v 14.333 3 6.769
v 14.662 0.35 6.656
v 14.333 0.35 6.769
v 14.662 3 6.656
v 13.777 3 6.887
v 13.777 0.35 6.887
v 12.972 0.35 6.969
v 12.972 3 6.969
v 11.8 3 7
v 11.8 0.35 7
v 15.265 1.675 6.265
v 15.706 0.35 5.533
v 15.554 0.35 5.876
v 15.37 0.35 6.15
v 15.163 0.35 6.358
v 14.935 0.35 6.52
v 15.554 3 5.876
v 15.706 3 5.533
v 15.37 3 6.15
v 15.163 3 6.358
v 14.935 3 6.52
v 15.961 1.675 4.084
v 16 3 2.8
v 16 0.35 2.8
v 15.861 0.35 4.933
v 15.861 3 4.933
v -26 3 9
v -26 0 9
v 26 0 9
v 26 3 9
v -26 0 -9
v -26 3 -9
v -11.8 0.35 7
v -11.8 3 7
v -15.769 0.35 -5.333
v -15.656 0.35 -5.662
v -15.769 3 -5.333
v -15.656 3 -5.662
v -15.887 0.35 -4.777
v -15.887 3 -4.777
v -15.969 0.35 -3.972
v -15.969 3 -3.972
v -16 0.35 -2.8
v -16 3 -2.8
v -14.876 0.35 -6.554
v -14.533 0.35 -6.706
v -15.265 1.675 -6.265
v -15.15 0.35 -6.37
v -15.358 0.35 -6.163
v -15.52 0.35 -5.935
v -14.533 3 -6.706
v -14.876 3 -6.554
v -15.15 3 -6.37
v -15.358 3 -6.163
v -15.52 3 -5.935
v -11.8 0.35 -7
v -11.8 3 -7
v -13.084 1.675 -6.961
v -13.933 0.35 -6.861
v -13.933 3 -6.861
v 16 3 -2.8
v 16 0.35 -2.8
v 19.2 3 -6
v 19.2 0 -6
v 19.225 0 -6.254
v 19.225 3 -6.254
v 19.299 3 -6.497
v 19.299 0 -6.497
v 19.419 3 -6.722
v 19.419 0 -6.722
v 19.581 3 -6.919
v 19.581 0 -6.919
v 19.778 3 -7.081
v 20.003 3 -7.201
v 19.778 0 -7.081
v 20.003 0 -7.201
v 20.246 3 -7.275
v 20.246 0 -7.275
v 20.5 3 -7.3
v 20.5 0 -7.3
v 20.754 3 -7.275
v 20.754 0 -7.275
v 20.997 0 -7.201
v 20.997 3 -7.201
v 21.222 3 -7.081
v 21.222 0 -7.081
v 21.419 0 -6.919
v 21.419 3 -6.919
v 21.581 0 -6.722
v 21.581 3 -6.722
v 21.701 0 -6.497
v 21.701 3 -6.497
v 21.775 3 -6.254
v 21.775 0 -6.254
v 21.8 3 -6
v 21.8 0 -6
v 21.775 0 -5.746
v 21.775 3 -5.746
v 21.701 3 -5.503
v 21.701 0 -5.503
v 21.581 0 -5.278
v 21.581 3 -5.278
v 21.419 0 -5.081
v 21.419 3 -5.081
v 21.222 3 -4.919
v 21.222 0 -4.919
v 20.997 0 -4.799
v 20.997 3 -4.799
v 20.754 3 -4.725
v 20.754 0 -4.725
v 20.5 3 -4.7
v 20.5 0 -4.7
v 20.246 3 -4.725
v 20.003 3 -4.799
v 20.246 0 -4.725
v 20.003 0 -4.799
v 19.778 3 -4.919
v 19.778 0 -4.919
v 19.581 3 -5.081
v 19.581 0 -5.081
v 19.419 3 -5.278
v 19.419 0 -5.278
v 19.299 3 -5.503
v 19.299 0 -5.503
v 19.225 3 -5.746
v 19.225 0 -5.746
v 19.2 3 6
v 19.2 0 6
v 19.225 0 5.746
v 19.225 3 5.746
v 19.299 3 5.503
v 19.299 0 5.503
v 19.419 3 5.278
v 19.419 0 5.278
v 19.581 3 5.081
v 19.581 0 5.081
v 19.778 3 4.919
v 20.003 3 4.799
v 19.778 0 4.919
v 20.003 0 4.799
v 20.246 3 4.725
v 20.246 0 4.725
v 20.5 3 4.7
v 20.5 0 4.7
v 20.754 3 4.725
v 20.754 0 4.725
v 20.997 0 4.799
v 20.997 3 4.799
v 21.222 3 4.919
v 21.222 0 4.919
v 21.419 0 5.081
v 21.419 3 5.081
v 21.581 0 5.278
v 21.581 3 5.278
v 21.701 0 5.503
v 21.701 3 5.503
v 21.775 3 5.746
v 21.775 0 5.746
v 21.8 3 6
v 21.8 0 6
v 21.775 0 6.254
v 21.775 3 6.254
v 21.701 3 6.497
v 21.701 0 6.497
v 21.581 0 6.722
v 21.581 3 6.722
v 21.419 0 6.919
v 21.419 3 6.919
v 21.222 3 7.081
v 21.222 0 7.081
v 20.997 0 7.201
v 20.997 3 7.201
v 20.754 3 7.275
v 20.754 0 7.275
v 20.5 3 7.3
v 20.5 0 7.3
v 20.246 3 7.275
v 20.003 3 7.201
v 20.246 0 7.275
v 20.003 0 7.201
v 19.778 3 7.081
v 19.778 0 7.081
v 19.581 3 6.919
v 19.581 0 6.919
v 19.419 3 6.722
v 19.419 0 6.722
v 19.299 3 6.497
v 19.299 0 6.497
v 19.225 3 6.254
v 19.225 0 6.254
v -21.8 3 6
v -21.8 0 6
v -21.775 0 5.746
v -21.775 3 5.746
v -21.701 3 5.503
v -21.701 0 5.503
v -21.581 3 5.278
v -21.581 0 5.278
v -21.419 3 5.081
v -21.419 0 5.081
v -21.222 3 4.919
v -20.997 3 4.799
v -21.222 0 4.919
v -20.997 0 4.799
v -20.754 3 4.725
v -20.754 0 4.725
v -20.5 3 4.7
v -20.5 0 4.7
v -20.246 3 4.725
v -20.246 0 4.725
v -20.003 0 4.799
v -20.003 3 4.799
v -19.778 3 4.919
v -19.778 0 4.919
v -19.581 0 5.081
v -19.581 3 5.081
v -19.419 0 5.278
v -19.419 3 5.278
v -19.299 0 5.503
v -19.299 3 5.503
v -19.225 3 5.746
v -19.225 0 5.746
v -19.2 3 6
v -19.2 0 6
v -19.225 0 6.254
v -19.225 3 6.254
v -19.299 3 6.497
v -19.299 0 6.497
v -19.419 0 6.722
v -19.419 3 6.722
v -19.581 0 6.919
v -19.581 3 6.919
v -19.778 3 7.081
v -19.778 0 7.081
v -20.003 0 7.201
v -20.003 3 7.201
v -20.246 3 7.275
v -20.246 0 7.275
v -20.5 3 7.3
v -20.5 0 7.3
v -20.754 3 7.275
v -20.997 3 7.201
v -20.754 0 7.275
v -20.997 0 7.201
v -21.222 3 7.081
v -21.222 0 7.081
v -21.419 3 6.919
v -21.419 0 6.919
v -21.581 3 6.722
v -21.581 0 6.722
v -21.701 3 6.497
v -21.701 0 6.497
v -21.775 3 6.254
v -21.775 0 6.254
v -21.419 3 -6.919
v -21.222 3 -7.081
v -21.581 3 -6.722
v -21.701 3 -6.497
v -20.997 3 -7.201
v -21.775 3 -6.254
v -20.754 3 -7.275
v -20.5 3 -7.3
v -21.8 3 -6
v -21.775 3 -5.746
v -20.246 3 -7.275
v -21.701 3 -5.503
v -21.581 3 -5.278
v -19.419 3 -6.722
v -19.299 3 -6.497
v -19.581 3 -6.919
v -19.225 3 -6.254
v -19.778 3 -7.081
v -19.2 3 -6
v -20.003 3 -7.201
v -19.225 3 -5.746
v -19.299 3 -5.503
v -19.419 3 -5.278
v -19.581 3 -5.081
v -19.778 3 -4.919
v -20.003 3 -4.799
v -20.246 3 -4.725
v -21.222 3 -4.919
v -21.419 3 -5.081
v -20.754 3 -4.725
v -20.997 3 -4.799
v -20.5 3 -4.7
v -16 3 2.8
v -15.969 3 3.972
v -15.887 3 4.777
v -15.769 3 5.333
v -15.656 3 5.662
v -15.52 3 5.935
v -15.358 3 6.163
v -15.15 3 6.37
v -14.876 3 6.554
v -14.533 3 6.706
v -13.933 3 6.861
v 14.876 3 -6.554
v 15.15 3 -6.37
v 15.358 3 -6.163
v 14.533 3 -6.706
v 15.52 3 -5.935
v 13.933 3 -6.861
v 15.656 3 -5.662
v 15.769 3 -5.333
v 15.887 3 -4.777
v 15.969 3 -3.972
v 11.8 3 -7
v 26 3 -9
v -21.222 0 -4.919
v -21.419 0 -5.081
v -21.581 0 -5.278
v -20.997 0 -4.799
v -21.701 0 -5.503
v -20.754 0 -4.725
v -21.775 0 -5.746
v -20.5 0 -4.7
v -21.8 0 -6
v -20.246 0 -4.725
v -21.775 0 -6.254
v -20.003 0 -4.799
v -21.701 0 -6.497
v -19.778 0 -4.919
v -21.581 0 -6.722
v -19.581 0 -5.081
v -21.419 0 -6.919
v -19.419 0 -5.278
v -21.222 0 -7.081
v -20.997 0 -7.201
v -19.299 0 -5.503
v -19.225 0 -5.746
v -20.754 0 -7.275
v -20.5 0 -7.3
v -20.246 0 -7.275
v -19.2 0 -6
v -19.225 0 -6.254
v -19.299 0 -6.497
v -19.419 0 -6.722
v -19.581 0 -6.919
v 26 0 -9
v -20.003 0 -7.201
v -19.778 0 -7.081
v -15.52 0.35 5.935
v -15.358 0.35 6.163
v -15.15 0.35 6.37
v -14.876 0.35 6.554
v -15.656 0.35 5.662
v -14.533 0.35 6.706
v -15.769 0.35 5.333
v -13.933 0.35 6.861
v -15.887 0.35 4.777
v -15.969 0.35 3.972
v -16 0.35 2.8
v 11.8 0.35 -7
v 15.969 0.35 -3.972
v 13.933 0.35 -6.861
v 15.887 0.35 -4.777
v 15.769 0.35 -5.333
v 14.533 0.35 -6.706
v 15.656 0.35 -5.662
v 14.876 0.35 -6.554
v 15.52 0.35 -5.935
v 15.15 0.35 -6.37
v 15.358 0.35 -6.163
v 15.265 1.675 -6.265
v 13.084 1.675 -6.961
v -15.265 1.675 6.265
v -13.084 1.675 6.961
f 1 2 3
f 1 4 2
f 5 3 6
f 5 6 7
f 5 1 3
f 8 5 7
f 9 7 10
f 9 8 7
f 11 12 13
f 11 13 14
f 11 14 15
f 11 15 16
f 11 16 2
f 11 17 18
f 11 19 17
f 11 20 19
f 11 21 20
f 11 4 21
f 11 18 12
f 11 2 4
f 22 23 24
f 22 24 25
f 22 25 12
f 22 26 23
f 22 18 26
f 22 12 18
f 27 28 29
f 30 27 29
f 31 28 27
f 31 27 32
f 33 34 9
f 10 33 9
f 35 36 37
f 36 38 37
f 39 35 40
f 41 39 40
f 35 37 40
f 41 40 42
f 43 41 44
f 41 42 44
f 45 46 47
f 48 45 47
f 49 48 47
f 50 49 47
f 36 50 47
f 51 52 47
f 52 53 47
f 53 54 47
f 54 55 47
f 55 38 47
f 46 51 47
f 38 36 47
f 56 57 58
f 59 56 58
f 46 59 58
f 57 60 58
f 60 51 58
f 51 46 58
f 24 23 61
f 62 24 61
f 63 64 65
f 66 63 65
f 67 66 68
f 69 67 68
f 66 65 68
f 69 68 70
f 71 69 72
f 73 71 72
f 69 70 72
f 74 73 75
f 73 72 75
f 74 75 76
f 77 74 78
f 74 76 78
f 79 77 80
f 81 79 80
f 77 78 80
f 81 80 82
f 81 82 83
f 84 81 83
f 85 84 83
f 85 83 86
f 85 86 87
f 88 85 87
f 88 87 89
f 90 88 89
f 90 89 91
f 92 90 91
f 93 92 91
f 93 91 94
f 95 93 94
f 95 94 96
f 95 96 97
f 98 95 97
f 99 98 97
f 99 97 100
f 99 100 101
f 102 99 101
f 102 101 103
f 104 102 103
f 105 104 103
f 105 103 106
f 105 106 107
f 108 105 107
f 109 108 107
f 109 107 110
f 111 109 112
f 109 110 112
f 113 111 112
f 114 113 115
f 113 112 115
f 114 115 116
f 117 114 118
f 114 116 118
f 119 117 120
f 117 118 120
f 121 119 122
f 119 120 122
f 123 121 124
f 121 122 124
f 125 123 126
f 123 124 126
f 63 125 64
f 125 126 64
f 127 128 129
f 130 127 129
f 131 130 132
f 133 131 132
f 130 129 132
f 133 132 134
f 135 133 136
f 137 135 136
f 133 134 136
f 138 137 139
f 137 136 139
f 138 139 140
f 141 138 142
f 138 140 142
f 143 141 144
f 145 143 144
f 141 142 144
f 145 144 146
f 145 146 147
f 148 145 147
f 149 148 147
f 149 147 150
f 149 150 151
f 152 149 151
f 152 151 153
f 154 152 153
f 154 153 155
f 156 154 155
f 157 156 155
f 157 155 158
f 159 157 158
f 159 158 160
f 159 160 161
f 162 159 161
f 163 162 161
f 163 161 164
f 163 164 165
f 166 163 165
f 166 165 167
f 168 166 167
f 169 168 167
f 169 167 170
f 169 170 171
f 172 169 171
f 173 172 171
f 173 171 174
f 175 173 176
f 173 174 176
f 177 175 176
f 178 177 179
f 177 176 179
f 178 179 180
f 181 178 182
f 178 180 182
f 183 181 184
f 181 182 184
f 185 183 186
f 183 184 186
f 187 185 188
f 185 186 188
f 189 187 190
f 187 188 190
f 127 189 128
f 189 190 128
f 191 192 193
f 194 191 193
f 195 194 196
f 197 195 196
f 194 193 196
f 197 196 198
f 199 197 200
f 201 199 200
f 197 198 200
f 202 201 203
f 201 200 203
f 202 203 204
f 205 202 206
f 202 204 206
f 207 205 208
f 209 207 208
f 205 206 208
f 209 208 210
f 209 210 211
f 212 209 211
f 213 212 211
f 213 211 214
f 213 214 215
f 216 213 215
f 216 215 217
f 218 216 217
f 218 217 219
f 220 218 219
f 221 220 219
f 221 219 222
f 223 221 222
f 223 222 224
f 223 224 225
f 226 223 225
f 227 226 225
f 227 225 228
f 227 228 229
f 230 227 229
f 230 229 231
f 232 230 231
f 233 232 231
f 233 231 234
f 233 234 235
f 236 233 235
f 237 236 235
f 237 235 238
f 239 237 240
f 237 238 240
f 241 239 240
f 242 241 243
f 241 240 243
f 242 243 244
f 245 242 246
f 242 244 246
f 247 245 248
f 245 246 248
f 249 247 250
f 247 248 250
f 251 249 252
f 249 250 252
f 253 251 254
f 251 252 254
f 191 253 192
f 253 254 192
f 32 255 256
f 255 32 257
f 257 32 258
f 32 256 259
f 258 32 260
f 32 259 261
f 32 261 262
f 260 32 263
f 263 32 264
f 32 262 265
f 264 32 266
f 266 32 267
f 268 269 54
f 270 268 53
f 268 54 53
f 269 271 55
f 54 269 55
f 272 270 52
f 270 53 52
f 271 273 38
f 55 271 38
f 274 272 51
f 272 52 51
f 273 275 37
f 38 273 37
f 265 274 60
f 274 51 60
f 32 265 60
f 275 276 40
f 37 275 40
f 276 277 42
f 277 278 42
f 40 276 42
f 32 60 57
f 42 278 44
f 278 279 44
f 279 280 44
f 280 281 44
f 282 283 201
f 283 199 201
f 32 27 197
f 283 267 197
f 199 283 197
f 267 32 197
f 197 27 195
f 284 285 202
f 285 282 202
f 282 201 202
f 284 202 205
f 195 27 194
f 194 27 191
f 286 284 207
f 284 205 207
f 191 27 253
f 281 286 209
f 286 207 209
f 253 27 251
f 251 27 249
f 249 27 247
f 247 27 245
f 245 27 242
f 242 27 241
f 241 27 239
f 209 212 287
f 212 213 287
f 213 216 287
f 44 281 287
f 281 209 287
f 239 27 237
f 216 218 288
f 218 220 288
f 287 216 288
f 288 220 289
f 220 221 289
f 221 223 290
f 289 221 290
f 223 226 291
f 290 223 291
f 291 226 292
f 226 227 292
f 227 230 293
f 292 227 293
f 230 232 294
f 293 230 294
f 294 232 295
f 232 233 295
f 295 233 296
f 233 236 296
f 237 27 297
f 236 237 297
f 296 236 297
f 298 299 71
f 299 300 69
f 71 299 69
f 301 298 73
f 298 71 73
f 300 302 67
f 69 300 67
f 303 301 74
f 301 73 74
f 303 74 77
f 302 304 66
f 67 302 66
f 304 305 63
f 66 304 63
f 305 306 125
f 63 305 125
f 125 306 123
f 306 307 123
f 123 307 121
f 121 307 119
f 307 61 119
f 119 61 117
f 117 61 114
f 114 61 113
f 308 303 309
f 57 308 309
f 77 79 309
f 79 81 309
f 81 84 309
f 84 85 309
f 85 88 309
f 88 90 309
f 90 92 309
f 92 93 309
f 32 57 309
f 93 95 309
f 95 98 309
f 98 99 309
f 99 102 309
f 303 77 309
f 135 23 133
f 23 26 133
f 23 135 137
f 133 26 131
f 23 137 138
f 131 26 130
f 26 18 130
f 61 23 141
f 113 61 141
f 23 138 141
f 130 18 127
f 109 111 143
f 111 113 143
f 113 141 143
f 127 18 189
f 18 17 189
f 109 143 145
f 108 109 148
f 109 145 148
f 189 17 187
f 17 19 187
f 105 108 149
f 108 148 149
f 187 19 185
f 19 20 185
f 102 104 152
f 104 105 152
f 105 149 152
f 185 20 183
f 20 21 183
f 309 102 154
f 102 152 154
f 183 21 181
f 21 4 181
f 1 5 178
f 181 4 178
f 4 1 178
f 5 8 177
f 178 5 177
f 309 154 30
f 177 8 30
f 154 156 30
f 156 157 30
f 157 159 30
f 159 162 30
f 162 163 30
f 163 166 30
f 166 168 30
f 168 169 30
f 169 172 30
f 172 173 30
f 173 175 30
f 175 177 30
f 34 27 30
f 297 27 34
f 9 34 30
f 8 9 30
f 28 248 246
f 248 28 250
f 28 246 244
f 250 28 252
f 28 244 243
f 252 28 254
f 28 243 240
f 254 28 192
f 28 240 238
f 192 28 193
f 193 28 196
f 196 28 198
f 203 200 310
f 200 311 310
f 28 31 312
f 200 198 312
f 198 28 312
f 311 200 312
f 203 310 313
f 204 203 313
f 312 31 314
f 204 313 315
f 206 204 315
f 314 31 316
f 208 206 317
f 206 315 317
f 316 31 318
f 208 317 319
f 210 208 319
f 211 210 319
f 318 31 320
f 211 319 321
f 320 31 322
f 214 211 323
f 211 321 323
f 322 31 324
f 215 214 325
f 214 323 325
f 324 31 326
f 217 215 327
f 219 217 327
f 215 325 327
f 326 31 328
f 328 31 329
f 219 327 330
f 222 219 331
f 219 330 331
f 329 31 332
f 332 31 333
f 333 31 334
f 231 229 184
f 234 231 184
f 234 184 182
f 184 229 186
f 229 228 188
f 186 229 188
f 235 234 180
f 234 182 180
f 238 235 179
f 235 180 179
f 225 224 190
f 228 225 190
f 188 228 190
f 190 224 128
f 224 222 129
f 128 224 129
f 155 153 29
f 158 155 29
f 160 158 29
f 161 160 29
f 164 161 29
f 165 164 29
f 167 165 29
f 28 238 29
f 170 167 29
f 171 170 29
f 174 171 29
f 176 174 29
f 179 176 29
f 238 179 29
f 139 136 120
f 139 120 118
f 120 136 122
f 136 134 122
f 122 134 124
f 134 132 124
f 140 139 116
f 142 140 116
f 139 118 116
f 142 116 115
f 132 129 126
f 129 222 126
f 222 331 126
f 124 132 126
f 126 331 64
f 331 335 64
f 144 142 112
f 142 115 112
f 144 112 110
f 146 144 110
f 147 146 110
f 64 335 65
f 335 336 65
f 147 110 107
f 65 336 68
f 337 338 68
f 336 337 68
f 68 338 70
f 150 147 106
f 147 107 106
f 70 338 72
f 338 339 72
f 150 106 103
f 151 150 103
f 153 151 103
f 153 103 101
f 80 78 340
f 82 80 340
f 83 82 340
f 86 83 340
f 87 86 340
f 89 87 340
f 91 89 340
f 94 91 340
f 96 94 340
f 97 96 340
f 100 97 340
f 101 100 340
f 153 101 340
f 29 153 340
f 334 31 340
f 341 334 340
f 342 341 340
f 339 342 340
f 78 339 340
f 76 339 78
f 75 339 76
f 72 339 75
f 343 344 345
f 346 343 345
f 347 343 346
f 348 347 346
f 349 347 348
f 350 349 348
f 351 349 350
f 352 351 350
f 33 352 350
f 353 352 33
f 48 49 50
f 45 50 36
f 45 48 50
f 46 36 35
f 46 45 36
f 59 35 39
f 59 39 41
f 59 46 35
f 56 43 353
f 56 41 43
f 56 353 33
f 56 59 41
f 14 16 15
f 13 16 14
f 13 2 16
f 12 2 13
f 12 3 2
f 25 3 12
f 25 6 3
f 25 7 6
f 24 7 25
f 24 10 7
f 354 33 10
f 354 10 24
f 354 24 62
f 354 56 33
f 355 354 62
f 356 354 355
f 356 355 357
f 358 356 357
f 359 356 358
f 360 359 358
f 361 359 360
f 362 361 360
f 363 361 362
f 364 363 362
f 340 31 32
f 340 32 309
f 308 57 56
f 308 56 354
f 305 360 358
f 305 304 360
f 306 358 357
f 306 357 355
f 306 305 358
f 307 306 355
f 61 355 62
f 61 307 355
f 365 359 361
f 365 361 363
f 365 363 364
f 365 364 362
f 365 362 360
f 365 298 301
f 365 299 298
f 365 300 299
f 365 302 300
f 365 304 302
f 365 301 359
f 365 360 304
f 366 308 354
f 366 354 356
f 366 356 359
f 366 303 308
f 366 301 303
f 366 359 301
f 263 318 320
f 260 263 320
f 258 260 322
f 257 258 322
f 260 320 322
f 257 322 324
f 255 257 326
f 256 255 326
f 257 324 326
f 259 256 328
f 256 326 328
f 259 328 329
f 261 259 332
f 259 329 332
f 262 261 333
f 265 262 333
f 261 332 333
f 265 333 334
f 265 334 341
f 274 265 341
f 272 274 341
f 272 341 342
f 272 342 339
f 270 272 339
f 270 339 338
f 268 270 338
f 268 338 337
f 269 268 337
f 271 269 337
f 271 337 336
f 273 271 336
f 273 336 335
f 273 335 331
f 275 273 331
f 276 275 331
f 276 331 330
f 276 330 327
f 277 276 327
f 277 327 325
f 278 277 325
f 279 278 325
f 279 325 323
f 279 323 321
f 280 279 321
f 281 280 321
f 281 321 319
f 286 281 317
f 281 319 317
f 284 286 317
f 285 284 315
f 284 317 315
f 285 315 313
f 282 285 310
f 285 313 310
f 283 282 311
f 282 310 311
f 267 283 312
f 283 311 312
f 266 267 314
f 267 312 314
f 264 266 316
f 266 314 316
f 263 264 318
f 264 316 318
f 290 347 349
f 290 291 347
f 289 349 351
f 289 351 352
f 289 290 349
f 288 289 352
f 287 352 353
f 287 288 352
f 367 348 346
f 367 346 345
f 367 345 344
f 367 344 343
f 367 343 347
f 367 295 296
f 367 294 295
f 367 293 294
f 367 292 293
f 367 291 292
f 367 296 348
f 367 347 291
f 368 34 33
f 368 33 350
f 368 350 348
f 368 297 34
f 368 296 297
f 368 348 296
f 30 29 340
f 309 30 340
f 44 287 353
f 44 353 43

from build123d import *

# Parameters (mm, degrees)
SKETCH1_W                  = 52
SKETCH1_H                  = 18
BOSS_EXTRUDE1_DEPTH        = 3
SKETCH2_W                  = 32
SKETCH2_H                  = 14
CUT_EXTRUDE1_DEPTH         = 2.65
FILLET1_SIZE               = 4.2
F_2_6_2_6_DIAMETER_HOLE1_D = 2.6


with BuildPart() as part:
    # Sketch1 → Boss-Extrude1 (new body)
    with BuildSketch(Plane(origin=(0, 0, 0), x_dir=(1, 0, 0), z_dir=(0, 1, 0))):
        Rectangle(SKETCH1_W, SKETCH1_H)
    extrude(amount=BOSS_EXTRUDE1_DEPTH)

    # Sketch2 → Cut-Extrude1 (cut)
    with BuildSketch(Plane(origin=(0, 3, 0), x_dir=(1, 0, 0), z_dir=(0, 1, 0))):
        Rectangle(SKETCH2_W, SKETCH2_H)
    extrude(amount=-CUT_EXTRUDE1_DEPTH, mode=Mode.SUBTRACT)

    # Fillet1
    # a fillet whose section is not a circle: 4.2 mm, written as the material it adds along each edge
    with BuildSketch(Plane(origin=(16, 3, 7), x_dir=(0, 0, -1), z_dir=(0, -1, 0)), Plane(origin=(-16, 3, 7), x_dir=(1, 0, 0), z_dir=(0, -1, 0)), Plane(origin=(16, 3, -7), x_dir=(-1, 0, 0), z_dir=(0, -1, 0))) as fillet1_piece_1:
        with BuildLine():
            Bezier((FILLET1_SIZE, 0), (0, 0), (0, -FILLET1_SIZE), weights=[1, 1.857142857, 1])
            Line((0, -FILLET1_SIZE), (-FILLET1_SIZE * 0.02, -FILLET1_SIZE))
            Line((-FILLET1_SIZE * 0.02, -FILLET1_SIZE), (-FILLET1_SIZE * 0.02, FILLET1_SIZE * 0.02))
            Line((-FILLET1_SIZE * 0.02, FILLET1_SIZE * 0.02), (FILLET1_SIZE, FILLET1_SIZE * 0.02))
            Line((FILLET1_SIZE, FILLET1_SIZE * 0.02), (FILLET1_SIZE, 0))
        make_face()
    extrude(amount=2.65)
    with BuildSketch(Plane(origin=(-16, 3, -7), x_dir=(1, 0, 0), z_dir=(0, -1, 0))) as fillet1_piece_2:
        with BuildLine():
            Bezier((FILLET1_SIZE, 0), (0, 0), (0, FILLET1_SIZE), weights=[1, 1.857142857, 1])
            Line((0, FILLET1_SIZE), (-FILLET1_SIZE * 0.02, FILLET1_SIZE))
            Line((-FILLET1_SIZE * 0.02, FILLET1_SIZE), (-FILLET1_SIZE * 0.02, -FILLET1_SIZE * 0.02))
            Line((-FILLET1_SIZE * 0.02, -FILLET1_SIZE * 0.02), (FILLET1_SIZE, -FILLET1_SIZE * 0.02))
            Line((FILLET1_SIZE, -FILLET1_SIZE * 0.02), (FILLET1_SIZE, 0))
        make_face()
    extrude(amount=2.65)

    # Ø2.6 (2.6) Diameter Hole1 (through all)
    with Locations(Plane(origin=(0, 3, 0), x_dir=(1, 0, 0), z_dir=(0, 1, 0))):
        with Locations((-20.5, 6), (-20.5, -6), (20.5, 6), (20.5, -6)):
            Hole(F_2_6_2_6_DIAMETER_HOLE1_D / 2)


solid = part.part
